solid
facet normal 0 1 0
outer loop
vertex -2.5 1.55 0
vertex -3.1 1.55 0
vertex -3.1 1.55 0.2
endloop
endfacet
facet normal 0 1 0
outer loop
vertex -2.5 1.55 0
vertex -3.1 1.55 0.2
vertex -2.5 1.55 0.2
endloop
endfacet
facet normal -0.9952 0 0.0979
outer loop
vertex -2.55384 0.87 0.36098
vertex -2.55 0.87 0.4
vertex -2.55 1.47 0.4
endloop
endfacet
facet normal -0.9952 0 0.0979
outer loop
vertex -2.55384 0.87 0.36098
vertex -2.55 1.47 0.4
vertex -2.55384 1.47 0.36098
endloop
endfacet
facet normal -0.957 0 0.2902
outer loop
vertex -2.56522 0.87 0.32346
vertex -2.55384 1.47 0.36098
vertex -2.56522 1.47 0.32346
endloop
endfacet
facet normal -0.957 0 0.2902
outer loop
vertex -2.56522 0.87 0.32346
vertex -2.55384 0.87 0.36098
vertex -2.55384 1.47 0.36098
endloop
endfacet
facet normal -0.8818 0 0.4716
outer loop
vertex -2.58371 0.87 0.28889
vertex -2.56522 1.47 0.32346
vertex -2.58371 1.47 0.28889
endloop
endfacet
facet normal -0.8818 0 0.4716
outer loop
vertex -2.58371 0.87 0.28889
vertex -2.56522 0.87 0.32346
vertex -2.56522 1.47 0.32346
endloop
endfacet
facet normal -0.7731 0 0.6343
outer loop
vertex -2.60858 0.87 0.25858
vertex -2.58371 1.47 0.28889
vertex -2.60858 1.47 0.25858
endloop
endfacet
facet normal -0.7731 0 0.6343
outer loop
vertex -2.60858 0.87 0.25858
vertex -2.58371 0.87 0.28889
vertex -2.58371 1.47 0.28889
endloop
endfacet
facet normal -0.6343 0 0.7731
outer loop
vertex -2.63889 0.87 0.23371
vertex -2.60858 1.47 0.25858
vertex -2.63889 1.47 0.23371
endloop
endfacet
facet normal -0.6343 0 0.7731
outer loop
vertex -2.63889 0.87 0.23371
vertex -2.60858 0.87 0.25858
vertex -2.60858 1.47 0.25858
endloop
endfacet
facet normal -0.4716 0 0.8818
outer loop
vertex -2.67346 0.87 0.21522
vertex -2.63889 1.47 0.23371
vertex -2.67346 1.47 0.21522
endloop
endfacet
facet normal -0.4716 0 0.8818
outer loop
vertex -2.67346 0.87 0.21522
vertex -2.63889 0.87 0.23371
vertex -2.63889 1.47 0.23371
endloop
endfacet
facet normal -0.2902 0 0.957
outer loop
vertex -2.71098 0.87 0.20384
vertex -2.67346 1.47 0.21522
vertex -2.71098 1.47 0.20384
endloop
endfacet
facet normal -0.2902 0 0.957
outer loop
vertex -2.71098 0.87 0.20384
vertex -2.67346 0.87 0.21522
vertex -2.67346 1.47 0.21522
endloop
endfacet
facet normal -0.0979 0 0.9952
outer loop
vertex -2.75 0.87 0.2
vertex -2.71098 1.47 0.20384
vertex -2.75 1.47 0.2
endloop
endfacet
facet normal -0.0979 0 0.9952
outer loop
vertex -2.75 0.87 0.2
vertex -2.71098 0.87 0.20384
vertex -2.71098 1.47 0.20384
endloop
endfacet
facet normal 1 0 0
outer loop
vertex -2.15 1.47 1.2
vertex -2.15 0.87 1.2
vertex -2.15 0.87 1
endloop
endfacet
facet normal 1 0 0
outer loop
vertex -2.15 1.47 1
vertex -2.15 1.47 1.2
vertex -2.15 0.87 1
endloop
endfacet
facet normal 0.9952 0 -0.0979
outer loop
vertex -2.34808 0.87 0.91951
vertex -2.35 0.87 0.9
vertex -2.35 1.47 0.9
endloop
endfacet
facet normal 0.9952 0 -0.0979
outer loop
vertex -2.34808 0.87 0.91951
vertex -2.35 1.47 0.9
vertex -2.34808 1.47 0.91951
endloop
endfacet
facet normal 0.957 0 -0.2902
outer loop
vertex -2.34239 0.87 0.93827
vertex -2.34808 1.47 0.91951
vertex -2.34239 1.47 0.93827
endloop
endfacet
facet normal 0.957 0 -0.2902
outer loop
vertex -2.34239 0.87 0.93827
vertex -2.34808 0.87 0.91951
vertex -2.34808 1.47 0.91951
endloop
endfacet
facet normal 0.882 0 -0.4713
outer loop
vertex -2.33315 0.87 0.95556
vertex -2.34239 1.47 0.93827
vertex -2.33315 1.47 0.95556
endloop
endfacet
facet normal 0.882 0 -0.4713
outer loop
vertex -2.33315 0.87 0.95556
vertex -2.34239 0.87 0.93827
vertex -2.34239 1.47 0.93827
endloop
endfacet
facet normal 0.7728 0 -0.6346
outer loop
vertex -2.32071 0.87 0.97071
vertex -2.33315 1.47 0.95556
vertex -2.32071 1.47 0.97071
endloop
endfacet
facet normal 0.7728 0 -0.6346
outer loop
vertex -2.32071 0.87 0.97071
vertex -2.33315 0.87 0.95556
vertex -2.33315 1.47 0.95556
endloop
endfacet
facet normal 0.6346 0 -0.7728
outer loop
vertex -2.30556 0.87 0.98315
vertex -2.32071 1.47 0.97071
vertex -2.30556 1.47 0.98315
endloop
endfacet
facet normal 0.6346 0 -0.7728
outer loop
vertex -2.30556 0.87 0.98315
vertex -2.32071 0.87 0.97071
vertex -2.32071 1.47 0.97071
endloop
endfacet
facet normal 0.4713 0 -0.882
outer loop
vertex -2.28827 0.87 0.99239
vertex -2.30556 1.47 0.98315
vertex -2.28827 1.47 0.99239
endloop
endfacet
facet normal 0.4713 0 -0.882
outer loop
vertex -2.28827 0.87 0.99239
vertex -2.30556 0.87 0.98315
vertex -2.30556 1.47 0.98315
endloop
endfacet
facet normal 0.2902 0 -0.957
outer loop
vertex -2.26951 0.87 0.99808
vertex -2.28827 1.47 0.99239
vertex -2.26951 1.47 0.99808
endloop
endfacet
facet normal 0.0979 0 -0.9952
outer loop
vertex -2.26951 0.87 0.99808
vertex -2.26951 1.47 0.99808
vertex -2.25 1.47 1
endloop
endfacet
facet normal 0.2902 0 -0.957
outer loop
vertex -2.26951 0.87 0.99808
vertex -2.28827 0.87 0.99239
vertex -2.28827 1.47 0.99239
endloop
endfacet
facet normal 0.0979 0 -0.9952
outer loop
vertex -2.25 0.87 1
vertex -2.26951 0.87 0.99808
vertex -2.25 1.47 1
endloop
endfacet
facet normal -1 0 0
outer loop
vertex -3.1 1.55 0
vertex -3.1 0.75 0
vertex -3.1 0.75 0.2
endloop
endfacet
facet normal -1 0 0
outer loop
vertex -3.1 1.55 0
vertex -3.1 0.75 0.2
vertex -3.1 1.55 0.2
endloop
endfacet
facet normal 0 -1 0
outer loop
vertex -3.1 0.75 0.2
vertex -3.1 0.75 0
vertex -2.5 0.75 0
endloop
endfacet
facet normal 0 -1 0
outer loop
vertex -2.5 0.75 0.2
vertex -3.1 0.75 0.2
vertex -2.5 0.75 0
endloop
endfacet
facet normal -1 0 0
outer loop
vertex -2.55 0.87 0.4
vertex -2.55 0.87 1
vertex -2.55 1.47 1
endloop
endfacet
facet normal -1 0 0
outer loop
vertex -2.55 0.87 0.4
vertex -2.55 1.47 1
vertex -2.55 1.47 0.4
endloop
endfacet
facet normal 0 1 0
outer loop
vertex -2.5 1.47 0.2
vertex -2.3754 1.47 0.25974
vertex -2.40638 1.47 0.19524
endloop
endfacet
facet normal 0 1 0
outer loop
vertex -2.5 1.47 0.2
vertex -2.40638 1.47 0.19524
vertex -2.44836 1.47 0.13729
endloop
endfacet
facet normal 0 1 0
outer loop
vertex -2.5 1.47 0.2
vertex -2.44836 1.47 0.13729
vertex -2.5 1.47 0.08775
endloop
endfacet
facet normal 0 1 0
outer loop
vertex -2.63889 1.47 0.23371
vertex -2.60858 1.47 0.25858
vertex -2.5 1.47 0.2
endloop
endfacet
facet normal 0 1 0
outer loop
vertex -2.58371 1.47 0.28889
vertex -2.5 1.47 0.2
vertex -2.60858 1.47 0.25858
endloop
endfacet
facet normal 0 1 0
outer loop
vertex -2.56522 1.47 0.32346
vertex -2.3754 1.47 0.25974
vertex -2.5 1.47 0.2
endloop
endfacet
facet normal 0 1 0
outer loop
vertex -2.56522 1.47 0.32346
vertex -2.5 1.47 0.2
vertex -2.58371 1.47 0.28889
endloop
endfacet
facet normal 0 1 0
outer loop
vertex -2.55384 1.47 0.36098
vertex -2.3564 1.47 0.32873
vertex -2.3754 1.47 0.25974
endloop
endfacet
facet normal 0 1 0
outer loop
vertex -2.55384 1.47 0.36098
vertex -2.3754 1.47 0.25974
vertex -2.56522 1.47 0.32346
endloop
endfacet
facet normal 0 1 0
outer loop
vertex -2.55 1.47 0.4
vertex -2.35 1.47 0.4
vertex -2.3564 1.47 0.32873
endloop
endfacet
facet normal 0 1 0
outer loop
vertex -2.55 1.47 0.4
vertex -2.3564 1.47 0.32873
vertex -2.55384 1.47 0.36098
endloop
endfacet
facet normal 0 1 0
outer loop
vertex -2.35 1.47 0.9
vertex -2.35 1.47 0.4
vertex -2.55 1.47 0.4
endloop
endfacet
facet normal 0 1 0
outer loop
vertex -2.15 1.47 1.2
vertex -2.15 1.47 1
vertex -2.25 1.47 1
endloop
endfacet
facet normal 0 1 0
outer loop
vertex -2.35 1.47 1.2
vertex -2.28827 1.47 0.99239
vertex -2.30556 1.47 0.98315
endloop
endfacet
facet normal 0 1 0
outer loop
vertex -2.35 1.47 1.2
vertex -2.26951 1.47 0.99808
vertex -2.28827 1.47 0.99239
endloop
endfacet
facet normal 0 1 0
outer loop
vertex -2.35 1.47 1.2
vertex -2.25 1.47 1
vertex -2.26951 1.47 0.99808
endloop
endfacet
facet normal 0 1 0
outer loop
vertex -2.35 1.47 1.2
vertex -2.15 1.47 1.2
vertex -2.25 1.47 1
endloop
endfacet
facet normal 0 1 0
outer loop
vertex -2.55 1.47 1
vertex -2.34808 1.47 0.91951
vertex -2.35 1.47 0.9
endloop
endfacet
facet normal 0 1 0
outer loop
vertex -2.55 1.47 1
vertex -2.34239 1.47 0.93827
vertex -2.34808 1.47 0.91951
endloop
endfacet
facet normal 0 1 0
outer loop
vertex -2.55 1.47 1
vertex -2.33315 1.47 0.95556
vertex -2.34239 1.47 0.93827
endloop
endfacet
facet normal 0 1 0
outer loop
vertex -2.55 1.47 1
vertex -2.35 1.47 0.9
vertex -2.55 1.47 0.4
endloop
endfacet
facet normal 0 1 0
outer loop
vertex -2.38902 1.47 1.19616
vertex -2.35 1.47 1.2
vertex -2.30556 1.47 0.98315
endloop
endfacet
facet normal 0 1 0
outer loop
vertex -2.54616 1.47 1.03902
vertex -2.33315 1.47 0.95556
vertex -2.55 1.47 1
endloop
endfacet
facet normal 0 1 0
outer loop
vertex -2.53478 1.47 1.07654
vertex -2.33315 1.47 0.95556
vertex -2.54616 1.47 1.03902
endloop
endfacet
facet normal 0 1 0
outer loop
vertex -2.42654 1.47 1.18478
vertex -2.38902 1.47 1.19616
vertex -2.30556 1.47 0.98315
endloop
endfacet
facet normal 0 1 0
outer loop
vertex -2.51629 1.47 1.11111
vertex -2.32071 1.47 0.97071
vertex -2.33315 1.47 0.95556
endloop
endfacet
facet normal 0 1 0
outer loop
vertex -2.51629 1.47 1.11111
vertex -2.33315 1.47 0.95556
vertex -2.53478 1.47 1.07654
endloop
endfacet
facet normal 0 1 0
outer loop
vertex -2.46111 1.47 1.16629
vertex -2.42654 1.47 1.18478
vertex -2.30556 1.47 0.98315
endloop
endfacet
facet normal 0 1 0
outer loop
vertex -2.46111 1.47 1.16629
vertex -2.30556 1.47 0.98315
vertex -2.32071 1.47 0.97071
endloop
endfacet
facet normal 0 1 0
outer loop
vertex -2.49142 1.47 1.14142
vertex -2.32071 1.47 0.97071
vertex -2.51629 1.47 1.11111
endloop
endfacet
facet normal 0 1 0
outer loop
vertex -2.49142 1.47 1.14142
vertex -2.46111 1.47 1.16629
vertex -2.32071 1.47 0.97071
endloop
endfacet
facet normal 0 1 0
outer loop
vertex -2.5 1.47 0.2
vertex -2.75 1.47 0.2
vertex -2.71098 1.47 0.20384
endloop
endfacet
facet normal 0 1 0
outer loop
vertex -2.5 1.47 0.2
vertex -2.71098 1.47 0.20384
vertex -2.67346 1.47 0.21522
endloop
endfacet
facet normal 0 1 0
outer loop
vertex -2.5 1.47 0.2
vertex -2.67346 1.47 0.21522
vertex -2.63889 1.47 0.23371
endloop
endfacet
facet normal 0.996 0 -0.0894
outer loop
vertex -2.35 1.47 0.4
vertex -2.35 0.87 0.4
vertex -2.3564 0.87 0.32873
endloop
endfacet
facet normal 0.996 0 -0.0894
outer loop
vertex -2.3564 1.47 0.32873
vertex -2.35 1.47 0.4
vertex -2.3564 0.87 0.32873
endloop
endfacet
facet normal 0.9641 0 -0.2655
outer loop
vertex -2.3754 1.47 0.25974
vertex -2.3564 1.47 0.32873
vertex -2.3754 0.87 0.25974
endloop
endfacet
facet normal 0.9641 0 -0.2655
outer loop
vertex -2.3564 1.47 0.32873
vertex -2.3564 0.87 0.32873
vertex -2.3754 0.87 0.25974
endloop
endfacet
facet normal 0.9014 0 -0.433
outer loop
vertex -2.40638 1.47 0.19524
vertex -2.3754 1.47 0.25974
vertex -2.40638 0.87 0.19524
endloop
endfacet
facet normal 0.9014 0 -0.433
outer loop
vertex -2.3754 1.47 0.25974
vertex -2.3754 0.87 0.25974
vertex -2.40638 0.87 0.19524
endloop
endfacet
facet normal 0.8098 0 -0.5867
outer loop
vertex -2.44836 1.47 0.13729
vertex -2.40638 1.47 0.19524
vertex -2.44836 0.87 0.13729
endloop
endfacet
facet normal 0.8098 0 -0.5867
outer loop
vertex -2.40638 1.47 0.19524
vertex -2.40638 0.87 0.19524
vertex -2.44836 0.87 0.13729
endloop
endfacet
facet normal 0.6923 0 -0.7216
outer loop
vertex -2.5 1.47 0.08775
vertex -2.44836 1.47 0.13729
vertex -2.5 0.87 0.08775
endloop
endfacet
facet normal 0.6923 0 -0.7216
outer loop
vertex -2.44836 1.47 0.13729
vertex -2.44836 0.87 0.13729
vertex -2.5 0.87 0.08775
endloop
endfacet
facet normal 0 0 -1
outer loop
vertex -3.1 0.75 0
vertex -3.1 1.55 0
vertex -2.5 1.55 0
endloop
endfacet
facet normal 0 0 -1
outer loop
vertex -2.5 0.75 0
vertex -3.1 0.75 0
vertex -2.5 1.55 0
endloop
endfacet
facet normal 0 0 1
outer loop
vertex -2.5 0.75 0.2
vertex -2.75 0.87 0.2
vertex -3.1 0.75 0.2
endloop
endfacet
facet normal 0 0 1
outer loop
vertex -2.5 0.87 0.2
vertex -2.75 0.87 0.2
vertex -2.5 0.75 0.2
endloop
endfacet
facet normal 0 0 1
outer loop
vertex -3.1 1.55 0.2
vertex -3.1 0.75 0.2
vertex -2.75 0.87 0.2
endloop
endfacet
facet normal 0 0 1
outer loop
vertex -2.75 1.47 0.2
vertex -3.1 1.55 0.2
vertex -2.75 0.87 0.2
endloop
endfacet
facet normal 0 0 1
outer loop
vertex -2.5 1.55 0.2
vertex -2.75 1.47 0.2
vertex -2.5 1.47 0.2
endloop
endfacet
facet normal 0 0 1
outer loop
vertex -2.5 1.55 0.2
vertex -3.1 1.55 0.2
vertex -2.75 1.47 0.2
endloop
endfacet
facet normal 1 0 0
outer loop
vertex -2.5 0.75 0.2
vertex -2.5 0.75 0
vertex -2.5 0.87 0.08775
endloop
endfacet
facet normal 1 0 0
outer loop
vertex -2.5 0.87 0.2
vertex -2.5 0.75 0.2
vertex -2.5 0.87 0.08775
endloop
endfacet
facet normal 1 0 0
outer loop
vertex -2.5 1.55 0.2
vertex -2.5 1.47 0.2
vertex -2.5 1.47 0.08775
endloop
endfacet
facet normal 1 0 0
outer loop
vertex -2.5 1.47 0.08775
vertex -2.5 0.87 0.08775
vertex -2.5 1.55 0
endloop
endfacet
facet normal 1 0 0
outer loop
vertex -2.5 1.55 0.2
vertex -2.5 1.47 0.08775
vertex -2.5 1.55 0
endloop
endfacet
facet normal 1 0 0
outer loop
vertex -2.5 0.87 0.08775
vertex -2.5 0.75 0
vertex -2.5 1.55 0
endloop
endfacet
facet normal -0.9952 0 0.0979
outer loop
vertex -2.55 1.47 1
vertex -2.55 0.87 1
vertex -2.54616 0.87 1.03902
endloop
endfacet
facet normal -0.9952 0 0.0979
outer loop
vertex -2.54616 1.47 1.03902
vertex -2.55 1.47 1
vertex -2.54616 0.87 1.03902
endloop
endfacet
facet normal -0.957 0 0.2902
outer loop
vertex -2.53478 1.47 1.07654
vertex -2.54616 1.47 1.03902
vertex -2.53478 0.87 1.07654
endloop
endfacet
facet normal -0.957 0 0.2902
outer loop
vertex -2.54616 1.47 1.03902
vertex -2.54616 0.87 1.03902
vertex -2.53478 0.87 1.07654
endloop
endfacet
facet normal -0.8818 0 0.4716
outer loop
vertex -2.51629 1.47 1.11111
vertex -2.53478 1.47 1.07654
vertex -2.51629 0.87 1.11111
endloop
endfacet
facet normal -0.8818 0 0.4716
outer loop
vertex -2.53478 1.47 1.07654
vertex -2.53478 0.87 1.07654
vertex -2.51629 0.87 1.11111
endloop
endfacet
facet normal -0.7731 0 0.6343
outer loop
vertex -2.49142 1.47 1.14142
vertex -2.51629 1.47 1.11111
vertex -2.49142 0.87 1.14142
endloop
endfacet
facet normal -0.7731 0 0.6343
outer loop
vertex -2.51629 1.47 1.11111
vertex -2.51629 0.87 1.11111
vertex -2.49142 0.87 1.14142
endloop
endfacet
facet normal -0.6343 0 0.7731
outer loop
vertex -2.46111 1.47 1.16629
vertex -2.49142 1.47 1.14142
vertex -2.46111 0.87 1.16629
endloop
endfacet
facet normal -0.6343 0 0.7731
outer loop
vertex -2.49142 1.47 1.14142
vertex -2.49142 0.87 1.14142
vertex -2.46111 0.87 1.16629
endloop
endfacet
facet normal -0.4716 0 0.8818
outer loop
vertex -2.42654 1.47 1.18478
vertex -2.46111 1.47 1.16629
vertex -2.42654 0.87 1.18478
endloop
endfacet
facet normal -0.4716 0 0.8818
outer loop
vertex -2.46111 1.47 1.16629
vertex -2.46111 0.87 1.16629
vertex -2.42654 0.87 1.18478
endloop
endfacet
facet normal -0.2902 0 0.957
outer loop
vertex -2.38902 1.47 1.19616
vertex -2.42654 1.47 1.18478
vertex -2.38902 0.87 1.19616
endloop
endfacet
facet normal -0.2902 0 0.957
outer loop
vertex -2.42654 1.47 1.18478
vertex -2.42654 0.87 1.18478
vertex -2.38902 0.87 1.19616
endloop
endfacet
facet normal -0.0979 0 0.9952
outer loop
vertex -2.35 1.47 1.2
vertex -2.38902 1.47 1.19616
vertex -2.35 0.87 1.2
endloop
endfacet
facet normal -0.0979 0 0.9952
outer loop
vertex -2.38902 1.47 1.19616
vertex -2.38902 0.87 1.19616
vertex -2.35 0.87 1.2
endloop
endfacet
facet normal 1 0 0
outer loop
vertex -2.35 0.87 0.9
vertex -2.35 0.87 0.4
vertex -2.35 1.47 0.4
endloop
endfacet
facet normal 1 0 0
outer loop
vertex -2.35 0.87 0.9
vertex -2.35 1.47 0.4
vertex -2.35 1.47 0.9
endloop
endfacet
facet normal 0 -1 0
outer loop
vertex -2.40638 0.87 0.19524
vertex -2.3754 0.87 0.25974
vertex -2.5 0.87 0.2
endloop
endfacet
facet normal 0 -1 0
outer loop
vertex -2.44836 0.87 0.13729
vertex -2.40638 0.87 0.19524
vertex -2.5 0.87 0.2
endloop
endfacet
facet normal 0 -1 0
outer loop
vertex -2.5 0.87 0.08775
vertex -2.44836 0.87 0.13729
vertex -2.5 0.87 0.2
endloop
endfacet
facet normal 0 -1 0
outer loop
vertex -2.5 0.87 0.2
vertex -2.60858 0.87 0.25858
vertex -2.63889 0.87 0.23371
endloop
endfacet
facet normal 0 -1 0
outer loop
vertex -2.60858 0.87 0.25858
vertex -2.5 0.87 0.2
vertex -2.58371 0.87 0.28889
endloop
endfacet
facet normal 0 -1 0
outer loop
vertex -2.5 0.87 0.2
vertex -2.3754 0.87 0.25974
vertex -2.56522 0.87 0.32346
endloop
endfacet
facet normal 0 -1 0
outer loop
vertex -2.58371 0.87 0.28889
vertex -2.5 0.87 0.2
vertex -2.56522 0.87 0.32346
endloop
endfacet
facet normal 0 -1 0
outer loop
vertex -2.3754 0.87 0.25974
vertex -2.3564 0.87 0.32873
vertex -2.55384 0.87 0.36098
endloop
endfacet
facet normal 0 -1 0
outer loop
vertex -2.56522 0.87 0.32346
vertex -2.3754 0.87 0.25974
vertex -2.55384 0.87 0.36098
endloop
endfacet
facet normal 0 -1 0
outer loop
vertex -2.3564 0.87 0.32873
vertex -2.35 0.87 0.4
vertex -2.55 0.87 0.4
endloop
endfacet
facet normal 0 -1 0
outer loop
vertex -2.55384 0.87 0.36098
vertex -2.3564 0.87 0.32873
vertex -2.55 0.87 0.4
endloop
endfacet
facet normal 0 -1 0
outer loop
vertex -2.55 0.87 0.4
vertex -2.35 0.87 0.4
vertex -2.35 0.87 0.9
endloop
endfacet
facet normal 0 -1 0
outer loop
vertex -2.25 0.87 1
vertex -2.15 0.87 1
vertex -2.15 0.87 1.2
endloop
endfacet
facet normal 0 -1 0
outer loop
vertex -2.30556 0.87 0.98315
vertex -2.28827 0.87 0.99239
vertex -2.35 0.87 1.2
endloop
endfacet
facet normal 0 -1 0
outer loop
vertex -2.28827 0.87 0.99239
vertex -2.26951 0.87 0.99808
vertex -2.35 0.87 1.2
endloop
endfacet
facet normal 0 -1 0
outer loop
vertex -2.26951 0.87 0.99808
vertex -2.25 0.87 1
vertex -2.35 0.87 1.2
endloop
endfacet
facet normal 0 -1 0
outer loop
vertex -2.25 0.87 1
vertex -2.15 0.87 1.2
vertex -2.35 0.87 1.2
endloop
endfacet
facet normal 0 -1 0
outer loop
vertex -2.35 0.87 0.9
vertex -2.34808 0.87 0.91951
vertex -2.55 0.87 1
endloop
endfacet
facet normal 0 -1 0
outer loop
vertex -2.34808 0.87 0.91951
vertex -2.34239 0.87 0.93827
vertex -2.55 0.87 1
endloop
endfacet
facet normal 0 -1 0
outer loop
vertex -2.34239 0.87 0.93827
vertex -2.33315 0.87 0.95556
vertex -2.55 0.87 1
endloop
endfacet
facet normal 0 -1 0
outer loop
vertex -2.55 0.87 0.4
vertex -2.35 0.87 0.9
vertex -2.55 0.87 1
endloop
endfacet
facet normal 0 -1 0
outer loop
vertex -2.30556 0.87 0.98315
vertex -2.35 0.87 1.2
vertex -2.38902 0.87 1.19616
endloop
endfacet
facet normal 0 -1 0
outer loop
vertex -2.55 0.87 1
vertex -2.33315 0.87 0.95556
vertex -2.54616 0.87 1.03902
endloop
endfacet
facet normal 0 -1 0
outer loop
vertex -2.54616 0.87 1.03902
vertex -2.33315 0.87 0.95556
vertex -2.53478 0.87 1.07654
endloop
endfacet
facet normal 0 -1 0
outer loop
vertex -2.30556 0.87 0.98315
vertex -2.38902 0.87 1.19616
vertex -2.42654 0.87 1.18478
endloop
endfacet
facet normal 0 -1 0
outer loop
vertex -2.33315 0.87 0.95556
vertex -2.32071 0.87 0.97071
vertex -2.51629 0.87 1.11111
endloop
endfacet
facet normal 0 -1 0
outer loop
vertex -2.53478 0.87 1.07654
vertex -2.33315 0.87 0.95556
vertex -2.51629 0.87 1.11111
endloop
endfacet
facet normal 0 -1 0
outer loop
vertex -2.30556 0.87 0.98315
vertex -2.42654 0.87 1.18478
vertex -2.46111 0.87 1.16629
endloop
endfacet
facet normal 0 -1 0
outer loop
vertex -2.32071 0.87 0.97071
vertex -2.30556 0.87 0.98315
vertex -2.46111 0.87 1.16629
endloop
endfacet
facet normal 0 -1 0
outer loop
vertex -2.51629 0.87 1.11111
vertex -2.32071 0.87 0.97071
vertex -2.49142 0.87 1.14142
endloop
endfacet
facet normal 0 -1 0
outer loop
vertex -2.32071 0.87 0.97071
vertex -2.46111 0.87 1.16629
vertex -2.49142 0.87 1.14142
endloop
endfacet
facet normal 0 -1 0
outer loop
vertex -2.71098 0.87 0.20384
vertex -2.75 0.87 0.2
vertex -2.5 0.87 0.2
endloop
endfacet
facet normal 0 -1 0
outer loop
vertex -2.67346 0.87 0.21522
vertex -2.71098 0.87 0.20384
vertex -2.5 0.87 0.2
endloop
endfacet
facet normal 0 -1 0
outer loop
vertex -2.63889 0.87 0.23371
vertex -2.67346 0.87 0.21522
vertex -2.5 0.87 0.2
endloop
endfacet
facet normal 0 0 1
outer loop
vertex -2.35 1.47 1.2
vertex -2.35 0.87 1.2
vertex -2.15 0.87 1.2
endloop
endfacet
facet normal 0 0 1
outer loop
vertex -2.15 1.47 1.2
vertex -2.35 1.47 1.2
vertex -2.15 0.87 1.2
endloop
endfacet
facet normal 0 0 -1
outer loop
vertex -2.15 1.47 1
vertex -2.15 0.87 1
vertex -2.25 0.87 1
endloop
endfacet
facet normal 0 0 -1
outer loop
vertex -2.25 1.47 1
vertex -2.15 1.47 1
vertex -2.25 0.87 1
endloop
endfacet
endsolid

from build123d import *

# Parameters (mm, degrees)
BOX038_W                = 0.6
BOX038_H                = 0.8
BOX038_DEPTH            = 0.2
PAD003_DEPTH            = 0.6
BODY003_PLACEMENT_ANGLE = 180


with BuildPart() as kub038:
    # Box038 → Box038 (new body)
    with BuildSketch(Plane(origin=(-3.1, 0.75, 0), x_dir=(1, 0, 0), z_dir=(0, 0, 1))):
        with Locations((0.3, 0.4)):
            Rectangle(BOX038_W, BOX038_H)
    extrude(amount=BOX038_DEPTH)


with BuildPart() as fusion005:
    # Sketch003 → Pad003 (new body)
    with BuildSketch(Plane.XZ):
        with BuildLine():
            ThreePointArc((3.7, 1), (3.641421, 1.141421), (3.5, 1.2))
            Line((3.5, 1.2), (3.3, 1.2))
            Line((3.3, 1.2), (3.3, 1))
            Line((3.3, 1), (3.4, 1))
            ThreePointArc((3.5, 0.9), (3.470711, 0.970711), (3.4, 1))
            Line((3.5, 0.4), (3.5, 0.9))
            ThreePointArc((3.5, 0.4), (3.617157, 0.117157), (3.9, 0))
            Line((4, 0), (3.9, 0))
            Line((4, 0.2), (4, 0))
            Line((3.9, 0.2), (4, 0.2))
            ThreePointArc((3.7, 0.4), (3.758579, 0.258579), (3.9, 0.2))
            Line((3.7, 1), (3.7, 0.4))
        make_face()
    extrude(amount=PAD003_DEPTH)


with BuildPart() as fusion005_1:
    # Body003 placement: moved
    add(fusion005.part.moved(Location((1.15, 0.87, 0))).rotate(Axis((1.15, 0.87, 0), (0, 0, 1)), BODY003_PLACEMENT_ANGLE))

    # Fusion005: union Kub038
    add(kub038.part)


solid = fusion005_1.part
